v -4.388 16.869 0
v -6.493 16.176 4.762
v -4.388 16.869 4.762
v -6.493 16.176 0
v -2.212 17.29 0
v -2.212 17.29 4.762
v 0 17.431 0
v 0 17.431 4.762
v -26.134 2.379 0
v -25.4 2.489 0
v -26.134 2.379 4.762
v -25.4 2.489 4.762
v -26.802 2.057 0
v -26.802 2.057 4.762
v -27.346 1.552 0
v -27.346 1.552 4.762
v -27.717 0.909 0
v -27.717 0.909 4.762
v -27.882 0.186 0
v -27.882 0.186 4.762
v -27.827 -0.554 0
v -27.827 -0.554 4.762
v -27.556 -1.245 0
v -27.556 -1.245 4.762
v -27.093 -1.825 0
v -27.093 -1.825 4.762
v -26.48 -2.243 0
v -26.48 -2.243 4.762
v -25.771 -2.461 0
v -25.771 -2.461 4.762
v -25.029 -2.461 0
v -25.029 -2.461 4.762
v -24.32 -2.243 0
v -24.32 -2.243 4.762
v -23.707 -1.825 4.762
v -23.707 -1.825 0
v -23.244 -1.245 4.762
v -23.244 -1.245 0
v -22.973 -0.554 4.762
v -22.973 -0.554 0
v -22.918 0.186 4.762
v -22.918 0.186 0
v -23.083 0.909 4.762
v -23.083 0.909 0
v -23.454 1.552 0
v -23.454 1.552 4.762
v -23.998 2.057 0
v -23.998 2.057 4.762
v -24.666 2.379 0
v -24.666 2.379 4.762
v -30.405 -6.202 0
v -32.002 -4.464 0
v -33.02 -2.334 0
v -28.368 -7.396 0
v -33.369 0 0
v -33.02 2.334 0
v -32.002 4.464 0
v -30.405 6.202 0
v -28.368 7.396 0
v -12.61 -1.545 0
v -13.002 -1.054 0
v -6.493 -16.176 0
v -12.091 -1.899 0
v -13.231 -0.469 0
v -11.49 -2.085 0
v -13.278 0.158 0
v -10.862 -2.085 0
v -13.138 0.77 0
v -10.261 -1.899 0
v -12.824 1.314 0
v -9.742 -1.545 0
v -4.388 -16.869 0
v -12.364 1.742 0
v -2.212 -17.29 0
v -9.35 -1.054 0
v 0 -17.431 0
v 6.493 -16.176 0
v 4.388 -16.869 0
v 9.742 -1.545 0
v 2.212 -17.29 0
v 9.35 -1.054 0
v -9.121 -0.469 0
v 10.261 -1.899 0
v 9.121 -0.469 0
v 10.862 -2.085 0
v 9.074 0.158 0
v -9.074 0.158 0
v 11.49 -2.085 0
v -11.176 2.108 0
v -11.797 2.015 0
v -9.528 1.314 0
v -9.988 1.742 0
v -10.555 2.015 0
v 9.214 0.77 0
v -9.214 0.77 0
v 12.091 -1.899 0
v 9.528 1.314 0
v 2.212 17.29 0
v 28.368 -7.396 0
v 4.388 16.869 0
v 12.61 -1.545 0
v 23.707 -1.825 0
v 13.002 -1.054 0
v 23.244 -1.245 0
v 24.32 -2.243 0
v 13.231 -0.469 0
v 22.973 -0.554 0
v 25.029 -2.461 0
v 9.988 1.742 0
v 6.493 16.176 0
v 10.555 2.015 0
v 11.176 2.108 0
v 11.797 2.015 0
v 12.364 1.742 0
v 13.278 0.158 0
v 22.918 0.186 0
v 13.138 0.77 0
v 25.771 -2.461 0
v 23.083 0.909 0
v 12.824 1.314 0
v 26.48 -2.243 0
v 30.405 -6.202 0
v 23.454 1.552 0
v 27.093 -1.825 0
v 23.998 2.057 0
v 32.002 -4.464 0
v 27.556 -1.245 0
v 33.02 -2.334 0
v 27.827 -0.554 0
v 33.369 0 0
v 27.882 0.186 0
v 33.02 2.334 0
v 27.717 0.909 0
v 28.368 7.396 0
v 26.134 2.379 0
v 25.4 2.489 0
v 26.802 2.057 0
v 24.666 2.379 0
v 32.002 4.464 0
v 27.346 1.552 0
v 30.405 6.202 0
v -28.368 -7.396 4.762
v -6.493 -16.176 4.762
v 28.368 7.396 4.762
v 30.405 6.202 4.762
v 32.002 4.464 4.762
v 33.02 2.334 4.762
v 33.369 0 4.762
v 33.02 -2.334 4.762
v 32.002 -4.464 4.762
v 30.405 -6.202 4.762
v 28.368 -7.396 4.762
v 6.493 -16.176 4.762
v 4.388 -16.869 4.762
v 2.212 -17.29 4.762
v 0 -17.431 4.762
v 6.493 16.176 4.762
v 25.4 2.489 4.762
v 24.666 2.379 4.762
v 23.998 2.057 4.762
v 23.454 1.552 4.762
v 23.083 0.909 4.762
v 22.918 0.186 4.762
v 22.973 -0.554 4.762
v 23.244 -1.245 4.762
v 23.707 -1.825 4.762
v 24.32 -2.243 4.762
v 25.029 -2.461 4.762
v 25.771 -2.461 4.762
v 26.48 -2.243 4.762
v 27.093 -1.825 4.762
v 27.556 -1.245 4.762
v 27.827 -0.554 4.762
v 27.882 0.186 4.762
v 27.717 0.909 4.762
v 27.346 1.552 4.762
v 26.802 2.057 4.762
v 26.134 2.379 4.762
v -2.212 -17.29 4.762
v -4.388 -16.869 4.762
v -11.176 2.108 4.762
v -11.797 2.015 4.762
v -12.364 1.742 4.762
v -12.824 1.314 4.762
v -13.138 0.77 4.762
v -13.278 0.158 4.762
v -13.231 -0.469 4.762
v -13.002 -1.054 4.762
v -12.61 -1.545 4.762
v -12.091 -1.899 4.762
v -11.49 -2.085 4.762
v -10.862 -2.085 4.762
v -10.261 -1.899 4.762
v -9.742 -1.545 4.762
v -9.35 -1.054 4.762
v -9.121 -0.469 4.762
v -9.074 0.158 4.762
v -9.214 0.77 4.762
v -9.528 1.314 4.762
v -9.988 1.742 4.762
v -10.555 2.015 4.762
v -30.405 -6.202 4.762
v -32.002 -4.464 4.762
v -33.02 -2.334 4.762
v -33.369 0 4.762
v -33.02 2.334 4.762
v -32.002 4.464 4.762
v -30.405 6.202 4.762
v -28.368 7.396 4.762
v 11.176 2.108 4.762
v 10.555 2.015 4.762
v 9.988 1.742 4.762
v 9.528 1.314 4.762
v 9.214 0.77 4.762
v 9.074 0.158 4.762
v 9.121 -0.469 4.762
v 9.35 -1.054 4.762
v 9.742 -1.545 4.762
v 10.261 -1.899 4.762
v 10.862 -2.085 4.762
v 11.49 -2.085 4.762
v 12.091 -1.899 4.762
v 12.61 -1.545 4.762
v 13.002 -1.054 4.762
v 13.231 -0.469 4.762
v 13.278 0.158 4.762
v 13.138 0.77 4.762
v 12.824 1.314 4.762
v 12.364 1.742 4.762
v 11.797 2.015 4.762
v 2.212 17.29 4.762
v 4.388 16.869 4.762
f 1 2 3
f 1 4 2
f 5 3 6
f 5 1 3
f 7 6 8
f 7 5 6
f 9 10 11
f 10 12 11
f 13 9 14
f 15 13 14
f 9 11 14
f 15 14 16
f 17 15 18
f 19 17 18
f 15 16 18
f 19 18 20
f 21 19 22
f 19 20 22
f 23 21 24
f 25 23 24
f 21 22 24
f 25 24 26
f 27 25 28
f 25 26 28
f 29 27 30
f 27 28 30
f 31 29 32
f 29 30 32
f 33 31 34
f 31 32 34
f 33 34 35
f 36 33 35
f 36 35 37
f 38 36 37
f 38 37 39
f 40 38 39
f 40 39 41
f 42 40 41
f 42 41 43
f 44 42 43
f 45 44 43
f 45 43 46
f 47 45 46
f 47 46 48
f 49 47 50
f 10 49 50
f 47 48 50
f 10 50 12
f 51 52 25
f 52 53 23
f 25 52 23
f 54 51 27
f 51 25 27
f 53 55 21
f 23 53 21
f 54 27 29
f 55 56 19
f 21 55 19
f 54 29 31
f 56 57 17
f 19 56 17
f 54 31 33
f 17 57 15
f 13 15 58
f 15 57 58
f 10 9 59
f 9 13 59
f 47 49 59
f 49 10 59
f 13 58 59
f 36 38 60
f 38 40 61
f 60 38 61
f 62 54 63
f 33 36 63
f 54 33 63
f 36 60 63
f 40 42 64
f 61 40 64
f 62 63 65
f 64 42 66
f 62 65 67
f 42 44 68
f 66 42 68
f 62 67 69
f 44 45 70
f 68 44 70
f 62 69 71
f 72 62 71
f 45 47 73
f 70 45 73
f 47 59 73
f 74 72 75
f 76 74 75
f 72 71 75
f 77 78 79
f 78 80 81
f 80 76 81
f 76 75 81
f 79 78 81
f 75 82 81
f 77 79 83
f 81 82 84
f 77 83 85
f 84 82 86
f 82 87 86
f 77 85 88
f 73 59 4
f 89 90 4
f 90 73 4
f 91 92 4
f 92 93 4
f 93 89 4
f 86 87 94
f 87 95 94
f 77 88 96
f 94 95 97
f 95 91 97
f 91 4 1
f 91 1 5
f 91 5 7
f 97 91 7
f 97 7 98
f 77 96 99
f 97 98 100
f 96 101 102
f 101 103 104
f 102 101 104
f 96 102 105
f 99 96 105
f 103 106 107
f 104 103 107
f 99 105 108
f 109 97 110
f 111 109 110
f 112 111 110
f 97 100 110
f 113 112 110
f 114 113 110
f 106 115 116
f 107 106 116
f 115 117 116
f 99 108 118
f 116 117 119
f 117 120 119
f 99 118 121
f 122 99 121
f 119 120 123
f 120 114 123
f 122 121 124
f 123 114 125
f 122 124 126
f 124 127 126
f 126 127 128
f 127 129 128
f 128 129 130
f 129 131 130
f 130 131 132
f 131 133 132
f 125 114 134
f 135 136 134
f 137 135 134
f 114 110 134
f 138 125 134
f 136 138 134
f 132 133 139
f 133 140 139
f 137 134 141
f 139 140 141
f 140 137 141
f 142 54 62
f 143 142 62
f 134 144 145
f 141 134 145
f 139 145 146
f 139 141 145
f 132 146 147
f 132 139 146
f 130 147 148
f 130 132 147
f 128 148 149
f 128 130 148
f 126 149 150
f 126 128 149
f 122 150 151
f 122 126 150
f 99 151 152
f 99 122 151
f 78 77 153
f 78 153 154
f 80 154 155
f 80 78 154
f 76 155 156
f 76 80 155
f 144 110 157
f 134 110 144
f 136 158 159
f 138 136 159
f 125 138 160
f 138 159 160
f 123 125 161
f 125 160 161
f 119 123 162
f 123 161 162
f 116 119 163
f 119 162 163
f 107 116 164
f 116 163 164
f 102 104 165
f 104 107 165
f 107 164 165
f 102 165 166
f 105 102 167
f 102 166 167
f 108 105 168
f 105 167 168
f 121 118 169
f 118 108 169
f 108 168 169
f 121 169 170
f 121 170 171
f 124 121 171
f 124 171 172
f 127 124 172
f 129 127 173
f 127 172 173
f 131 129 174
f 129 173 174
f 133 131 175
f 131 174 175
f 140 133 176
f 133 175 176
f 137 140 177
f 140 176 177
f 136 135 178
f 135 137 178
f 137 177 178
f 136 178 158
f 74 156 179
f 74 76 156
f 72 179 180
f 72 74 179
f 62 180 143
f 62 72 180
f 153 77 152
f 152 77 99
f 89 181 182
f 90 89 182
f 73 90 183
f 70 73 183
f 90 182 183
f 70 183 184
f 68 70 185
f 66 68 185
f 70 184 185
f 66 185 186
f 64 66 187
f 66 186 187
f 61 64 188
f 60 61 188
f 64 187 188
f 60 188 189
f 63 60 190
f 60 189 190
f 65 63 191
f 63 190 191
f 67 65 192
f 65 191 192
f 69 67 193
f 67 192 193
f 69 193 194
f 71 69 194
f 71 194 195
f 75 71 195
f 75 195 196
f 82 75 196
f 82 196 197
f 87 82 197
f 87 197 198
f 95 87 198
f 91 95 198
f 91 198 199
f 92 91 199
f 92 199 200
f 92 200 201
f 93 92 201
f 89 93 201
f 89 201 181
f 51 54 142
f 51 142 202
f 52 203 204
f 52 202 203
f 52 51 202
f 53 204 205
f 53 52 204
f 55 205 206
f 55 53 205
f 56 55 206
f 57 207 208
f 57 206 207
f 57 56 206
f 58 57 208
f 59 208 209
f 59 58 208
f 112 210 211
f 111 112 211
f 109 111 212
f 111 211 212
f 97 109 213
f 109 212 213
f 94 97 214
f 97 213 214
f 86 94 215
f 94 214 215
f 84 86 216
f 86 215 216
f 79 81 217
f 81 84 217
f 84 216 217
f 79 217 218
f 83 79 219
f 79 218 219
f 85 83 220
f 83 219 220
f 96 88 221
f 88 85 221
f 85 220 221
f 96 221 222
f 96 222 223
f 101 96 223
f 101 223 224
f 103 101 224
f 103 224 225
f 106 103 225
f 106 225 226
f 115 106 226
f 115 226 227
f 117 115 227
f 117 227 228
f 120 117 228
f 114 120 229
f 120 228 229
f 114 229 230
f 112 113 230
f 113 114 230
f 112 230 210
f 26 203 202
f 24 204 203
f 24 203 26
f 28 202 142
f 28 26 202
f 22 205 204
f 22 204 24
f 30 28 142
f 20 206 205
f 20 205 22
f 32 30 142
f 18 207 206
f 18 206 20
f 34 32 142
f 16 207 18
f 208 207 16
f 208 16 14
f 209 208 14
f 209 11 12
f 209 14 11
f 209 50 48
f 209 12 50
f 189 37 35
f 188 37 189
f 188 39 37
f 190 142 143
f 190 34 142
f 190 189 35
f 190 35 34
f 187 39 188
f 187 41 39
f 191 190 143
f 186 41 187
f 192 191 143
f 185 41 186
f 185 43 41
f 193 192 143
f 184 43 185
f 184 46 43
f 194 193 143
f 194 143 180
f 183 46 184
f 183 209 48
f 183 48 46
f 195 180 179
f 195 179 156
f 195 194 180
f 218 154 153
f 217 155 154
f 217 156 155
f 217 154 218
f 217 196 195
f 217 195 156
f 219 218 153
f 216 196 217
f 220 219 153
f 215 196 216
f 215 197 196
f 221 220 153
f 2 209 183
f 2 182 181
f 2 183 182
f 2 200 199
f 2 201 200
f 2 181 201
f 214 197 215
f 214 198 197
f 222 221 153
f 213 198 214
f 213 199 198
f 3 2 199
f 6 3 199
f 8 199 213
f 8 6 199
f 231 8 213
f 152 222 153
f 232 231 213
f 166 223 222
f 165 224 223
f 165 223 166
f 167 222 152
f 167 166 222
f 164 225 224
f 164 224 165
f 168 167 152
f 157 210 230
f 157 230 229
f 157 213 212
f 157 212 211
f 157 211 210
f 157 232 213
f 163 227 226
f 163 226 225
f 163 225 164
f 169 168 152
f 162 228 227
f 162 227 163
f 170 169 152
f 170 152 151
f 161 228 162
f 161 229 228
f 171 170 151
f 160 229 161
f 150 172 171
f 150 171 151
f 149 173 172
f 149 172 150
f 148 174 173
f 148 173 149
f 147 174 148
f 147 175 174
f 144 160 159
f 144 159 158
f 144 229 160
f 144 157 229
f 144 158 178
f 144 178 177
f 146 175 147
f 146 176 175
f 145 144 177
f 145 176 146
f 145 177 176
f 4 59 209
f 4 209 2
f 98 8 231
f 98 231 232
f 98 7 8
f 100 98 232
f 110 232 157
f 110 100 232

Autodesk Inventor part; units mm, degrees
ref_plane "YZ Plane" through (0, 0, 0) normal (1, 0, 0) x (0, 1, 0)
ref_plane "XZ Plane" through (0, 0, 0) normal (0, 1, 0) x (-1, 0, 0)
ref_plane "XY Plane" through (0, 0, 0) normal (0, 0, 1) x (1, 0, 0)
sketch "Sketch1" plane through (0, 0, 0) normal (0, 0, 1) x (1, 0, 0)
  arc A0 (0, 14.224) -> (0, -14.224) centre (0, 0) ccw construction
  arc A1 (0, 17.4307) -> (0, -17.4308) centre (0, 0) ccw
  line L0 (0, 0) -> (-25.4, 0)
  circle A2 centre (-25.4, 0) radius 4.7625 construction
  line L1 (0, 14.224) -> (0, -14.224)
  circle A3 centre (-25.4, 0) radius 7.9692
  line L2 (0, 14.224) -> (0, 17.4307)
  line L3 (0, -14.224) -> (0, -17.4308)
  line L4 (-28.3685, 7.3957) -> (-6.493, 16.1763)
  line L5 (-28.3685, -7.3957) -> (-6.493, -16.1763)
  point P0 (-11.176, 0)
  dimension "d0" = 28.448
  dimension "d2" = 25.4
  dimension "d3" = 9.525
  dimension "d6" = 3.2067
  dimension "d7" = 3.2067
  dimension "d8" = 11.176
extrude "Extrusion1" add sketch "Sketch1" along normal blind 4.7625
hole "Hole1" at (-25.4, 0, 0) direction (0, 0, 1) diameter 4.9784 end through all clearance for "Socket Head Cap Screw" size "#10" standard "Ansi Unified Screw Threads"
hole "Hole2" at (-11.176, 0, 0) direction (0, 0, 1) diameter 4.2164 end through all
mirror "Mirror1" about plane through (0, -17.4308, 0) normal (1, 0, 0)
equation "\"d6\" = d7"
properties part number "Pneumatic Mounting Plate"
